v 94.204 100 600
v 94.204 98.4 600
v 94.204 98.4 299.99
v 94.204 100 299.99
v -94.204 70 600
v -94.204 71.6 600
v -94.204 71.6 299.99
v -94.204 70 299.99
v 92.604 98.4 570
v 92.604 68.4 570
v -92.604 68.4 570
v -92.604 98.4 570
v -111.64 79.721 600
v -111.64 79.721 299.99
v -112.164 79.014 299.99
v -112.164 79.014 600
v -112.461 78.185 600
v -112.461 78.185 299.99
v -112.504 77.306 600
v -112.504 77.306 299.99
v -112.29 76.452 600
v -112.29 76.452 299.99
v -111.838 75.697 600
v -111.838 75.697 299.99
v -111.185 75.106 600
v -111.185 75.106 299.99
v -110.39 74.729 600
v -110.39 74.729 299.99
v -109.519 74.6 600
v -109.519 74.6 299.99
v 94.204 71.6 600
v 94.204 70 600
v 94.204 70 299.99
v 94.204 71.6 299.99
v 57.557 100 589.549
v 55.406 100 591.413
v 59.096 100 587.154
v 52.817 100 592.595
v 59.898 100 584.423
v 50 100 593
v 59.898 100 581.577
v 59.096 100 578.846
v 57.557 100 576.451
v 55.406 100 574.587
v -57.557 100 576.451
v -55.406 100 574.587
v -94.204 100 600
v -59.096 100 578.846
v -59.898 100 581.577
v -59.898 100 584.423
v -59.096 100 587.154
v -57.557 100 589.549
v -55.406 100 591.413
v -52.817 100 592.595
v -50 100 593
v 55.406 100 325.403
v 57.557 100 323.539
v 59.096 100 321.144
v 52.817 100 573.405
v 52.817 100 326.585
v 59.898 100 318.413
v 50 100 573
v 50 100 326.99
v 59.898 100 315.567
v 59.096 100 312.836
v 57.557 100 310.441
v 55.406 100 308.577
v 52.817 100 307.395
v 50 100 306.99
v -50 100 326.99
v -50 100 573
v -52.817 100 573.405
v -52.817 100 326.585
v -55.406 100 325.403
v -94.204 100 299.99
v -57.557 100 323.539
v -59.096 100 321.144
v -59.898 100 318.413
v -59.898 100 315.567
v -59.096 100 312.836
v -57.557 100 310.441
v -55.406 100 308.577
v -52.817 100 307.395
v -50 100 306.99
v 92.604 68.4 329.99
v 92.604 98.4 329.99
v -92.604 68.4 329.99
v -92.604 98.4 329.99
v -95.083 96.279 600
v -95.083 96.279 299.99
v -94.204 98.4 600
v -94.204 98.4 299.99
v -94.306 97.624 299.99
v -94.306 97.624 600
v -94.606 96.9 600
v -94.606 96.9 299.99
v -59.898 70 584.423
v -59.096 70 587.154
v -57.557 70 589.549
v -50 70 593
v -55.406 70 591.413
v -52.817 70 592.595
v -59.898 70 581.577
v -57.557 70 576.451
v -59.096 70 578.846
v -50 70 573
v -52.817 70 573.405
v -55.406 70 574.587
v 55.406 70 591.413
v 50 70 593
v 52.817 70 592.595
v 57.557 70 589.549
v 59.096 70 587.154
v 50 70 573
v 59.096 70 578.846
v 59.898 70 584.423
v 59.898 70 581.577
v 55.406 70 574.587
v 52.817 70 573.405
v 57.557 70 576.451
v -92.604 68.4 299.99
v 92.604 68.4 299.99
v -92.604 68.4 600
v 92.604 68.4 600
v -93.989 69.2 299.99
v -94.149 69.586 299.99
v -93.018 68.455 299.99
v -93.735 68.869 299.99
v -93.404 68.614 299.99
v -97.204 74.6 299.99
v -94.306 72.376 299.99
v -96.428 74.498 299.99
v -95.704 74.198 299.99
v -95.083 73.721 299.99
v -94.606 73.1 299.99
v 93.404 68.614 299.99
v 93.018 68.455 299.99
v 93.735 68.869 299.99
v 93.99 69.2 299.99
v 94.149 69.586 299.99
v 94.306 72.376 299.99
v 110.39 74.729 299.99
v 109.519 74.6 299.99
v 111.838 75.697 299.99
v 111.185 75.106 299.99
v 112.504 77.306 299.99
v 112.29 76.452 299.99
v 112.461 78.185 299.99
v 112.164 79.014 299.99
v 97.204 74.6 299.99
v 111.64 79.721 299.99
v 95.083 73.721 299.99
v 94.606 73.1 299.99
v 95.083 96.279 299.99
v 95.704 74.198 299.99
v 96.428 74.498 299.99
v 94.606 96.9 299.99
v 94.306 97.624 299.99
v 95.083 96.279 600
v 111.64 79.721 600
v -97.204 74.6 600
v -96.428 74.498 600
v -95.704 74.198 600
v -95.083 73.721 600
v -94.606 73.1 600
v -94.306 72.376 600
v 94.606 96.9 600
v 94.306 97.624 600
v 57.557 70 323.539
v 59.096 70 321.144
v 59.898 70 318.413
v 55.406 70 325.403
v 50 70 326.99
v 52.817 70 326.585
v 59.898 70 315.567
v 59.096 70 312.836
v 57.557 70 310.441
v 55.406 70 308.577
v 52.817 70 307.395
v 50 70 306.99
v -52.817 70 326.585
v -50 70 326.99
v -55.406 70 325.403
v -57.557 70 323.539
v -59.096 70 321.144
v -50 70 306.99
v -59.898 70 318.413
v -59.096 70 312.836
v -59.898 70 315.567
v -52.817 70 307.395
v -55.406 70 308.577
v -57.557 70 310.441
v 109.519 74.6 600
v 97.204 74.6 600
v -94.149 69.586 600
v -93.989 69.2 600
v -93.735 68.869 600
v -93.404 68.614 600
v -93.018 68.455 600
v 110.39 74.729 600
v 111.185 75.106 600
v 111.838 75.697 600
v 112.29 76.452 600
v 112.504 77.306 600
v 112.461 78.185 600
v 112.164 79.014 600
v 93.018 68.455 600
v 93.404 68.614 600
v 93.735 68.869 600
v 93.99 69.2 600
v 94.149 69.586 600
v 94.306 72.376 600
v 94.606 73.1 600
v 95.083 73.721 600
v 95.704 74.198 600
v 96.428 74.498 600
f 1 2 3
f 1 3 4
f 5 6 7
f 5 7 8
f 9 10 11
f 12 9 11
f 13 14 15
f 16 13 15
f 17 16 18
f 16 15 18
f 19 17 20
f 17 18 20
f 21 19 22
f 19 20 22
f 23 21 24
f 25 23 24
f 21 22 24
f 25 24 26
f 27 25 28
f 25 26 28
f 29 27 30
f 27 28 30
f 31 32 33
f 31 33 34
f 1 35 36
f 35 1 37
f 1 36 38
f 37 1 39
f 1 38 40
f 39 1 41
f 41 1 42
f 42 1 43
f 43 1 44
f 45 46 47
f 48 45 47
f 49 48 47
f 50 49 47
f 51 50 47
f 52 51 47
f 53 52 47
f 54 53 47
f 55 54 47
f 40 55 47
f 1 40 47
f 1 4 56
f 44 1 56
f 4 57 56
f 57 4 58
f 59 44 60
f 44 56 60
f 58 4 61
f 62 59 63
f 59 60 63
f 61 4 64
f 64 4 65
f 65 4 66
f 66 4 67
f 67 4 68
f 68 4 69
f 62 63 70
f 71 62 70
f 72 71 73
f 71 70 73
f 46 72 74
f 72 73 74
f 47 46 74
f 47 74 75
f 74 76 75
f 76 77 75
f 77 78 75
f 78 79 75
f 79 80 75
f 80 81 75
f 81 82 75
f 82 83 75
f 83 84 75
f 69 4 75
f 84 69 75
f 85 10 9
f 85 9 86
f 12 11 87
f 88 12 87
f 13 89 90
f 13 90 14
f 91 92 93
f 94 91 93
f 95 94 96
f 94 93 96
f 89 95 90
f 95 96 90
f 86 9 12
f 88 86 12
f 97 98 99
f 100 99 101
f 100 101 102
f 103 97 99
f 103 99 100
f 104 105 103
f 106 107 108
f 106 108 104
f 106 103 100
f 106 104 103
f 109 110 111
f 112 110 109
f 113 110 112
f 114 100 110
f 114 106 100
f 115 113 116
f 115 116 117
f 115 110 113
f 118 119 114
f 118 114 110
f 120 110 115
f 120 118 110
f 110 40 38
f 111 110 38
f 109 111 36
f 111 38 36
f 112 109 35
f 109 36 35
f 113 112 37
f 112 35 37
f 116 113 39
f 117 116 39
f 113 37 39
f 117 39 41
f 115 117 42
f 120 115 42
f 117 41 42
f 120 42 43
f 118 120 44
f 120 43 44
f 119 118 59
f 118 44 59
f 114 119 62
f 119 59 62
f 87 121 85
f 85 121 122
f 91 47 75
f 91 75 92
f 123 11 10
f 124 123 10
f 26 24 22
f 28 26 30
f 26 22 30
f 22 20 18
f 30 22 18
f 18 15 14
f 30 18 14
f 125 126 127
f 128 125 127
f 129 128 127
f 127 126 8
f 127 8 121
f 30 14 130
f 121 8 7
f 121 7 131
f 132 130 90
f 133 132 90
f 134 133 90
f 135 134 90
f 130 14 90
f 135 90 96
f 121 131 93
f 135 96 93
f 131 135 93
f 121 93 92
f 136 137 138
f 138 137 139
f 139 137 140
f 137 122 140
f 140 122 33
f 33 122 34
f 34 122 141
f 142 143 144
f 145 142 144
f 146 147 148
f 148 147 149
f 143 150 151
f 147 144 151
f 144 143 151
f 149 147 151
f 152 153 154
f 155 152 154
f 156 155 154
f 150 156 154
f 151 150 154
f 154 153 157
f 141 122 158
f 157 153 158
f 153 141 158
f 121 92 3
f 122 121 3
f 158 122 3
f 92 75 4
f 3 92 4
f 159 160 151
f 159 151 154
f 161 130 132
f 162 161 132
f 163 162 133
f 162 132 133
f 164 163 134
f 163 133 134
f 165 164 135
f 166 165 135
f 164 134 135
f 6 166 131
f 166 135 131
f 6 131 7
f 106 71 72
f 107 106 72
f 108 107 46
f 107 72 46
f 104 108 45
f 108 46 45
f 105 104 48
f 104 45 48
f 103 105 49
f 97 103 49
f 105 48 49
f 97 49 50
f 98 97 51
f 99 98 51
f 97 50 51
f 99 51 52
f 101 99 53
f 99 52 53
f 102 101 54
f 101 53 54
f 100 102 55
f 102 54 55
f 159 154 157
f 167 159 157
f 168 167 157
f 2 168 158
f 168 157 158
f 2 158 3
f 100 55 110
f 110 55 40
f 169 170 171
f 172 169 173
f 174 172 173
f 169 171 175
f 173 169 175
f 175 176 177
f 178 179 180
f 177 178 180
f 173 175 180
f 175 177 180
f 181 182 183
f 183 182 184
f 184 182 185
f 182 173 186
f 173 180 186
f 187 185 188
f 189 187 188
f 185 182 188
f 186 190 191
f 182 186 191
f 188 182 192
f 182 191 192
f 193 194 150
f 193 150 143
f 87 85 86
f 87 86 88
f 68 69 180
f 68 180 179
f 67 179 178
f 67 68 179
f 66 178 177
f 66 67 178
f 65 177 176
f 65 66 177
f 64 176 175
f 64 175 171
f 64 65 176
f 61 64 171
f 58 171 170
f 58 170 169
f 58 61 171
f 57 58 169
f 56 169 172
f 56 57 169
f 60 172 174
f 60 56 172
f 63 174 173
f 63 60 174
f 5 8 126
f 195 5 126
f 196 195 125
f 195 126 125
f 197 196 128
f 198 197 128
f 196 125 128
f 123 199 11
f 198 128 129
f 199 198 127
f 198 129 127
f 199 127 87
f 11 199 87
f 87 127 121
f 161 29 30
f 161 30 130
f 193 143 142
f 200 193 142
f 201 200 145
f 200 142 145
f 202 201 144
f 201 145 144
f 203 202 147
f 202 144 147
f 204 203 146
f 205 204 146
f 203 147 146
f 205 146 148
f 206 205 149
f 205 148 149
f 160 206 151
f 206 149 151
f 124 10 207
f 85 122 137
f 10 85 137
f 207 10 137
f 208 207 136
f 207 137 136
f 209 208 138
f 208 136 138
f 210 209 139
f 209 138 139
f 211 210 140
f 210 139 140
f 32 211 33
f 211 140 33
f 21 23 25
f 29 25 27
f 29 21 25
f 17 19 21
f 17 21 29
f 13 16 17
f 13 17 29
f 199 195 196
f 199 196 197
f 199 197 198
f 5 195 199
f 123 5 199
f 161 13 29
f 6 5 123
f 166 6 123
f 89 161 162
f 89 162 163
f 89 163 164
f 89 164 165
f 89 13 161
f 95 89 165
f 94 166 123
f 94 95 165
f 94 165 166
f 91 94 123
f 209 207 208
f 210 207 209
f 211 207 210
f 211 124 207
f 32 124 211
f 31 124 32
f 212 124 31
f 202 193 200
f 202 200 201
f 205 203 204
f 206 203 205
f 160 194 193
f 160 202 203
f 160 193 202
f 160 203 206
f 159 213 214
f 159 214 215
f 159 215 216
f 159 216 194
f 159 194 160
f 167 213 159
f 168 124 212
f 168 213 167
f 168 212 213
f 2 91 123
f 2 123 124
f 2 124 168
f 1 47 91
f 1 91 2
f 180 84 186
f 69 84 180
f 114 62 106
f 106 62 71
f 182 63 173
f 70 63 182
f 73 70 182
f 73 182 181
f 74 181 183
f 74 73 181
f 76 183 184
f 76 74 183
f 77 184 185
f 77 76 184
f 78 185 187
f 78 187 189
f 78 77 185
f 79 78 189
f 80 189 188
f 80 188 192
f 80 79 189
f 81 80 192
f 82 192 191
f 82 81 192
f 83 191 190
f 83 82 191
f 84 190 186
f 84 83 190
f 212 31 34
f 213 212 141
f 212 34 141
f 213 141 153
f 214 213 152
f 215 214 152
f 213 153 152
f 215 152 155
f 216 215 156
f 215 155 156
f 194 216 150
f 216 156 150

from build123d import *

# Parameters (mm, degrees)
STOCK_PAYLOAD_BAY_1_START = 299.99
STOCK_PAYLOAD_BAY_1_DEPTH = 300.010025
CUT_EXTRUDE2_DEPTH        = 30
SKETCH1_W                 = 185.207649842
SKETCH1_H                 = 240.010025
CUT_EXTRUDE1_DEPTH        = 30


# Read off the part's stored shape, not the designer's step: Stock-Payload_bay-1
with BuildPart() as part:
    # Stock-Payload_bay-1 outline → Stock-Payload_bay-1 (new body)
    with BuildSketch(Plane.XY.offset(STOCK_PAYLOAD_BAY_1_START)):
        with BuildLine():
            Line((94.203991807, 98.4), (94.203991807, 100))
            Line((94.203991807, 100), (-94.203991807, 100))
            Line((-94.203991807, 100), (-94.203991807, 98.4))
            ThreePointArc((-94.203991807, 98.4), (-94.43235321, 97.251949701), (-95.082671465, 96.278679653))
            Line((-95.082671465, 96.278679653), (-111.640030762, 79.721320356))
            ThreePointArc((-111.640030762, 79.721320356), (-112.290349017, 76.45194971), (-109.518710415, 74.600000005))
            Line((-109.518710415, 74.600000005), (-97.203991812, 74.600000005))
            ThreePointArc((-97.203991812, 74.600000005), (-95.082671465, 73.721320347), (-94.203991807, 71.6))
            Line((-94.203991807, 71.6), (-94.203991807, 70))
            ThreePointArc((-94.203991807, 70), (-93.735146897, 68.868608907), (-92.603658035, 68.4))
            Line((-92.603658035, 68.4), (92.603991807, 68.4))
            ThreePointArc((92.603991807, 68.4), (93.735362657, 68.86862915), (94.203991807, 70))
            Line((94.203991807, 70), (94.203991807, 71.6))
            ThreePointArc((94.203991807, 71.6), (95.082671465, 73.721320347), (97.203991812, 74.600000005))
            Line((97.203991812, 74.600000005), (109.518710415, 74.600000005))
            ThreePointArc((109.518710415, 74.600000005), (112.290349017, 76.45194971), (111.640030762, 79.721320356))
            Line((111.640030762, 79.721320356), (95.082671465, 96.278679653))
            ThreePointArc((95.082671465, 96.278679653), (94.43235321, 97.251949701), (94.203991807, 98.4))
        make_face()
    extrude(amount=STOCK_PAYLOAD_BAY_1_DEPTH)

    # Sketch2 → Cut-Extrude2 (cut)
    with BuildSketch(Plane(origin=(0, 100, 0), x_dir=(1, 0, 0), z_dir=(0, 1, 0))):
        with BuildLine():
            Line((-50, -306.99), (50, -306.99))
            ThreePointArc((50, -306.99), (60, -316.99), (50, -326.99))
            Line((50, -326.99), (-50, -326.99))
            ThreePointArc((-50, -326.99), (-60, -316.99), (-50, -306.99))
        make_face()
        with BuildLine():
            Line((-50, -593.000025), (50, -593.000025))
            ThreePointArc((50, -593.000025), (60, -583.000025), (50, -573.000025))
            Line((50, -573.000025), (-50, -573.000025))
            ThreePointArc((-50, -573.000025), (-60, -583.000025), (-50, -593.000025))
        make_face()
    extrude(amount=-CUT_EXTRUDE2_DEPTH, mode=Mode.SUBTRACT)

    # Sketch1 → Cut-Extrude1 (cut)
    with BuildSketch(Plane(origin=(0, 68.4, 0), x_dir=(-1, 0, 0), z_dir=(0, -1, 0))):
        with Locations((-0.000166886, -449.9950125)):
            Rectangle(SKETCH1_W, SKETCH1_H)
    extrude(amount=-CUT_EXTRUDE1_DEPTH, mode=Mode.SUBTRACT)


solid = part.part
